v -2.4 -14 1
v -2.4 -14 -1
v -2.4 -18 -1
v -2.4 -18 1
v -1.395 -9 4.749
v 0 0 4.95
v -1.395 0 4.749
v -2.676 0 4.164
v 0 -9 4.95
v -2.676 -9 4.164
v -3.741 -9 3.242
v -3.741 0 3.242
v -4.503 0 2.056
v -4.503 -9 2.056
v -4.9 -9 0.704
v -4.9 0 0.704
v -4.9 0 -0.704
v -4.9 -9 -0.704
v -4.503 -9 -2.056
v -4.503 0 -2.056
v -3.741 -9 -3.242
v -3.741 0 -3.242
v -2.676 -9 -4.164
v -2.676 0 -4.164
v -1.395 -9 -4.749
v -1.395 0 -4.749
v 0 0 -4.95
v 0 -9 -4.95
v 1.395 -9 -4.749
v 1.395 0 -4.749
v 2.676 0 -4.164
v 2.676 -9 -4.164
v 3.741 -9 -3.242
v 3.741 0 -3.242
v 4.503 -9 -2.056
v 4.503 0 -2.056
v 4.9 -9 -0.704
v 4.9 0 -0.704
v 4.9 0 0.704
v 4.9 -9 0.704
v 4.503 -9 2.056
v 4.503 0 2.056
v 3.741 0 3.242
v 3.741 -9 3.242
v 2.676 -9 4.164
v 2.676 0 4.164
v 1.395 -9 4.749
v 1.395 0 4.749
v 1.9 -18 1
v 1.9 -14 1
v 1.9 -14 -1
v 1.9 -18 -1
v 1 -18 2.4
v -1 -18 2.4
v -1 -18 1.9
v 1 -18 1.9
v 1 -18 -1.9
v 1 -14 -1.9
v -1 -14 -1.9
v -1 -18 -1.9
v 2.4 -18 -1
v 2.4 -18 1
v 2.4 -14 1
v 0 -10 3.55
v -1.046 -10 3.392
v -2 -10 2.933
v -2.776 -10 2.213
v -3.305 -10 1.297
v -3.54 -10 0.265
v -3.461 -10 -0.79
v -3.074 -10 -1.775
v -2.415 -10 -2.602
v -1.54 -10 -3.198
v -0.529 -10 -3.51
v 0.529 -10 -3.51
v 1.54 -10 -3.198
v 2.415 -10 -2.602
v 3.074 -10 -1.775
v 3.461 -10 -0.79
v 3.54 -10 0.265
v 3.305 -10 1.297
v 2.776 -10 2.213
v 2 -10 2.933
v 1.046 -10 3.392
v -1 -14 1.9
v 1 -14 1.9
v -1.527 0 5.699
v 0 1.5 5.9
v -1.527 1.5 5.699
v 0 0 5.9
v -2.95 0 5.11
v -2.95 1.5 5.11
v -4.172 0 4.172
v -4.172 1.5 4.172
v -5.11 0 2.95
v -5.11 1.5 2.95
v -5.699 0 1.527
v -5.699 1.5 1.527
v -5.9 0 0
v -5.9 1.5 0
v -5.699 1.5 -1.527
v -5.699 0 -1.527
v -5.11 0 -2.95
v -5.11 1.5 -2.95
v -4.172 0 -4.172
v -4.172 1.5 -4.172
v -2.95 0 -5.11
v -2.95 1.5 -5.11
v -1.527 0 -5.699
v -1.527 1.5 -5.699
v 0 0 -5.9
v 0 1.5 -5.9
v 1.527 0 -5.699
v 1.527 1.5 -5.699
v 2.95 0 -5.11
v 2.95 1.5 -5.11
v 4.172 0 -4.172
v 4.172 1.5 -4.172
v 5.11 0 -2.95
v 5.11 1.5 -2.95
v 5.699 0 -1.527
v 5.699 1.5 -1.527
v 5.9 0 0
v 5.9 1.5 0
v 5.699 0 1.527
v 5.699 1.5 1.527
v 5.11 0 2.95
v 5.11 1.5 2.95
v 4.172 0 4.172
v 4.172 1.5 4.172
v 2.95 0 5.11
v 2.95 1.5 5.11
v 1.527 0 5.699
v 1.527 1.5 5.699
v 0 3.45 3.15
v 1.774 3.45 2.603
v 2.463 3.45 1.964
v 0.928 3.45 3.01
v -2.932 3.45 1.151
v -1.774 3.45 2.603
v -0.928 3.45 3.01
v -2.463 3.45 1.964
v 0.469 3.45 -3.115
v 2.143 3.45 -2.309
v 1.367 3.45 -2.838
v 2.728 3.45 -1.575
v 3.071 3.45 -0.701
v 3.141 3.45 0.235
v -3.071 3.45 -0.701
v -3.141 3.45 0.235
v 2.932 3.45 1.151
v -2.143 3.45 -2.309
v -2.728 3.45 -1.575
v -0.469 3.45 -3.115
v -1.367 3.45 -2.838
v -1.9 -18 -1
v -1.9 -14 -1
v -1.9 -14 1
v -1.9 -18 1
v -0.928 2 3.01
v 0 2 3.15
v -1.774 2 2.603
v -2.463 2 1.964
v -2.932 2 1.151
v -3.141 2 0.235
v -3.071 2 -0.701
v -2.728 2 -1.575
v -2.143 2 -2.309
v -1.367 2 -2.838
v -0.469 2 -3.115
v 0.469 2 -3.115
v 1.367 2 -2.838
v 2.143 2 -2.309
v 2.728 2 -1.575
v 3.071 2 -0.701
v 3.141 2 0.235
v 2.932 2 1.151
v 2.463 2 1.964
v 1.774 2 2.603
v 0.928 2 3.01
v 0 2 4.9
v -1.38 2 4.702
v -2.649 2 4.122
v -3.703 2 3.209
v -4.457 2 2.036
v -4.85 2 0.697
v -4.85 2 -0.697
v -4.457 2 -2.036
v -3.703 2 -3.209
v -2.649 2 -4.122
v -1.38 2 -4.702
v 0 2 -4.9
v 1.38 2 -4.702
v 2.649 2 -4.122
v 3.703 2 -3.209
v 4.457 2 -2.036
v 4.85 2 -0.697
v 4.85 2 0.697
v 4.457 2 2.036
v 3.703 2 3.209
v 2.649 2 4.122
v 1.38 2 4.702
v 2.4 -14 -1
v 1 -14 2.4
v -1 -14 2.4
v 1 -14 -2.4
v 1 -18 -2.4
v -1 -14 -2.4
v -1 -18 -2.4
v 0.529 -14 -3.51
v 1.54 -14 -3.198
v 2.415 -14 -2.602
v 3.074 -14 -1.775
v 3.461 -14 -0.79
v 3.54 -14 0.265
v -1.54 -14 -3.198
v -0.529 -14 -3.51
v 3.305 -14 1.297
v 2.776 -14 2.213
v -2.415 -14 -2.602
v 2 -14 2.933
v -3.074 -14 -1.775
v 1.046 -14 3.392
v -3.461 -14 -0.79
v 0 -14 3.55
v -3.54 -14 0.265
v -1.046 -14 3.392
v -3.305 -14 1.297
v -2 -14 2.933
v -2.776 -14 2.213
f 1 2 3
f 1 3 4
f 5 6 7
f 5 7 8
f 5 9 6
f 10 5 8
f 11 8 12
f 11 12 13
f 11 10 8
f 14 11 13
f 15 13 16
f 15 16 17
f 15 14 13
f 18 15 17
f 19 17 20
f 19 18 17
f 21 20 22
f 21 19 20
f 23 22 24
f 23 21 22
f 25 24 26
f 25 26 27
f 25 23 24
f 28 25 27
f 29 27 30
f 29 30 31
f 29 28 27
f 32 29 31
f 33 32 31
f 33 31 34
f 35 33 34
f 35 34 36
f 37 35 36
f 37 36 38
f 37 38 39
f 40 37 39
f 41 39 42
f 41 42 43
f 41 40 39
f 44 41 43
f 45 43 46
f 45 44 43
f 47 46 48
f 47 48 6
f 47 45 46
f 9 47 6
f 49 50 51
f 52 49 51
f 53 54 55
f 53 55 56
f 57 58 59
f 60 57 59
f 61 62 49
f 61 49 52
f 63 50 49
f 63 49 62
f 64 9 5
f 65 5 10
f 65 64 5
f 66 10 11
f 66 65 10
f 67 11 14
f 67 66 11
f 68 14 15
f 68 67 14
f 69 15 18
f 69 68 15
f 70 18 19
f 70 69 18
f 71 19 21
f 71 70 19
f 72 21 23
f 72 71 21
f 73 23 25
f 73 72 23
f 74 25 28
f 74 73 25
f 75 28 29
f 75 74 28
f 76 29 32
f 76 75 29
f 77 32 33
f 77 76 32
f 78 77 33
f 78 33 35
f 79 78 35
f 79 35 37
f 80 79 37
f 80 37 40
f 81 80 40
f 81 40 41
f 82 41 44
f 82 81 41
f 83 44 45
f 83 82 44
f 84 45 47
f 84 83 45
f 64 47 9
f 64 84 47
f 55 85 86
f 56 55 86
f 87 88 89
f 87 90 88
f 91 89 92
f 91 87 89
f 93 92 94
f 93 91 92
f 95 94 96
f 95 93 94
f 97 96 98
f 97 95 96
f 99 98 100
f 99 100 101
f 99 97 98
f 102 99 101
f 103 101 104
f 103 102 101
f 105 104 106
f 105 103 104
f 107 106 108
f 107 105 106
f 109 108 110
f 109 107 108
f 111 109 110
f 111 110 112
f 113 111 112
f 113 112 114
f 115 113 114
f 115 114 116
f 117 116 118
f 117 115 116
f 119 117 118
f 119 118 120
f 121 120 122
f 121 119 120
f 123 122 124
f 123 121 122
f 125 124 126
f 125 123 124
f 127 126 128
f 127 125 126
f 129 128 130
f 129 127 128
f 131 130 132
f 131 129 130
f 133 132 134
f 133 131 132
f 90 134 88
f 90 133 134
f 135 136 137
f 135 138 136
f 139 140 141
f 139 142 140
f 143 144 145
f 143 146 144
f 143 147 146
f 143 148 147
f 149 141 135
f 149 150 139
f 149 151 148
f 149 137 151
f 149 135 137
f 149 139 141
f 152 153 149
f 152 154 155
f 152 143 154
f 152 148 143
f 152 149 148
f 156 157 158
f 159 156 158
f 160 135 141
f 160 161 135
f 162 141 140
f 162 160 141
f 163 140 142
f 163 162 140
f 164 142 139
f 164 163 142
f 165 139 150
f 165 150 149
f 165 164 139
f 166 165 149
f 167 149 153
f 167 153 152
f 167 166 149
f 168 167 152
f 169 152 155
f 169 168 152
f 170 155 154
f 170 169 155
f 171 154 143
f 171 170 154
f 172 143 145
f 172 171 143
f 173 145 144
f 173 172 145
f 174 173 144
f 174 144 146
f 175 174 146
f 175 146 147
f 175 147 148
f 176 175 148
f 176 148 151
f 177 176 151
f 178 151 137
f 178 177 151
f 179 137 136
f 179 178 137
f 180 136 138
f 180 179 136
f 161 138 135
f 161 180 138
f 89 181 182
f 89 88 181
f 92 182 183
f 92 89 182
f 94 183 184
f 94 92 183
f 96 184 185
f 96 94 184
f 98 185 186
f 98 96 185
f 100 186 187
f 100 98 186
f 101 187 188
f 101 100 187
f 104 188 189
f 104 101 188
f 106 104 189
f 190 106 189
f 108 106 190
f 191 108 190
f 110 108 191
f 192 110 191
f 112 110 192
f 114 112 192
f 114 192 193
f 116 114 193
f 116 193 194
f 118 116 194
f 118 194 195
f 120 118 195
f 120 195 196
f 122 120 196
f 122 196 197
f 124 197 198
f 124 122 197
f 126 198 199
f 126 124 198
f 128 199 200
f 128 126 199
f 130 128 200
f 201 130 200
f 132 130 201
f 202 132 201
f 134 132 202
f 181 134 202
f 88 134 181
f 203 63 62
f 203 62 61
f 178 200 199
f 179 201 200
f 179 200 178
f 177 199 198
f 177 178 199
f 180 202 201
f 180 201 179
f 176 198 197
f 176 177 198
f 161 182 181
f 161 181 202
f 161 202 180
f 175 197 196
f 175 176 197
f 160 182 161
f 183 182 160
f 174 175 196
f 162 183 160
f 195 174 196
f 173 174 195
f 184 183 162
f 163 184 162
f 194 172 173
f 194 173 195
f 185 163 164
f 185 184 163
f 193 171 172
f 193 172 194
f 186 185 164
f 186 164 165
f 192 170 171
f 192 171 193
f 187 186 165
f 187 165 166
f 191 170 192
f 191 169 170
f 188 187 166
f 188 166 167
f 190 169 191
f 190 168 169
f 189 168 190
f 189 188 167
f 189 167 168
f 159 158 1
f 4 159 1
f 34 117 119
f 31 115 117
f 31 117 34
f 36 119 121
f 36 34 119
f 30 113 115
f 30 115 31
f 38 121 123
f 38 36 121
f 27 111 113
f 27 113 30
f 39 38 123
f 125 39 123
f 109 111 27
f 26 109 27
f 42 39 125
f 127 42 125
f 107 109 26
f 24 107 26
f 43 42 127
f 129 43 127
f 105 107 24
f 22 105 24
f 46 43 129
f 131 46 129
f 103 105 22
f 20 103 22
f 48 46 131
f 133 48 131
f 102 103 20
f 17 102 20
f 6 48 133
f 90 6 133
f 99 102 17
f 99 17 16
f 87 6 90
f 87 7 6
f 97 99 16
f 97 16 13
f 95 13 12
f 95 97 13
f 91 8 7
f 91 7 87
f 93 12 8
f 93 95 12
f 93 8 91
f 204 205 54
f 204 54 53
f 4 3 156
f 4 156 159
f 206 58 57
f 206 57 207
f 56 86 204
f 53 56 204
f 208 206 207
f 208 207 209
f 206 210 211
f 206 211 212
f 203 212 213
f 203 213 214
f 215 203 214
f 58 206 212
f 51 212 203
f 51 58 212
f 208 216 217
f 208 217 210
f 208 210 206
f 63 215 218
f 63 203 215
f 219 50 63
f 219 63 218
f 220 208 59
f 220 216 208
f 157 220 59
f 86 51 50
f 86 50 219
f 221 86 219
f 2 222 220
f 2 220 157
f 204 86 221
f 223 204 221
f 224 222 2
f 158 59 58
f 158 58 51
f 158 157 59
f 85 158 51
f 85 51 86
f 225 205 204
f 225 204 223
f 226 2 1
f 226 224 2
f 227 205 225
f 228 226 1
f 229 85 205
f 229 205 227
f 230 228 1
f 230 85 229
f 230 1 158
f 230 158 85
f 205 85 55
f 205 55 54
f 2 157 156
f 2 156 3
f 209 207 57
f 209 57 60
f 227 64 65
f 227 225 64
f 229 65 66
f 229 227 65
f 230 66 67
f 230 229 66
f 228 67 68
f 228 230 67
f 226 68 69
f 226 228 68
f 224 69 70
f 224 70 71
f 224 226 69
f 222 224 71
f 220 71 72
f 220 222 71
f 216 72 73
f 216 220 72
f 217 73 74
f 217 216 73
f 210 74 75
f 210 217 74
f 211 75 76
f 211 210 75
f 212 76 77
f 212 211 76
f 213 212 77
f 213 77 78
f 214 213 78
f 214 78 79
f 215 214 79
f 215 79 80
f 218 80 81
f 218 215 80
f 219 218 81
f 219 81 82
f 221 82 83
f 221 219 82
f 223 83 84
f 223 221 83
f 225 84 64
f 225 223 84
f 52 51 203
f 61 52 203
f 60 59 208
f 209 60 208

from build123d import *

# Parameters (mm, degrees)
ESQUISSE2_W                  = 2
ESQUISSE2_H                  = 0.5
BOSS_EXTRU_1_DEPTH           = 4
R_P_TITION_CIRCULAIRE1_COUNT = 4


with BuildPart() as part:
    # Esquisse1 → Révolution1 (revolve)
    with BuildSketch(Plane.XY, mode=Mode.PRIVATE) as r_volution1_sk:
        Polygon((0, 3.45), (-3.15, 3.45), (-3.15, 2), (-4.9, 2), (-5.9, 1.5), (-5.9, 0), (-4.95, 0), (-4.95, -9), (-3.55, -10), (-3.55, -14), (0, -14), align=None)
    revolve(r_volution1_sk.sketch.rotate(Axis((0, 55, 0), (0, -1, 0)), 270), axis=Axis((0, 55, 0), (0, -1, 0)))

    # Esquisse2 → Boss.-Extru.1 (add)
    with BuildSketch(Plane.XZ.offset(14)):
        with Locations((0, 2.15)):
            Rectangle(ESQUISSE2_W, ESQUISSE2_H)
    boss_extru_1 = extrude(amount=BOSS_EXTRU_1_DEPTH)

    # Répétition circulaire1: Boss.-Extru.1 ×4 about axis
    r_p_tition_circulaire1_axis = Axis((0, 0, 0), (0, 1, 0))
    for i in range(1, R_P_TITION_CIRCULAIRE1_COUNT):
        add(boss_extru_1.rotate(r_p_tition_circulaire1_axis, i * 360 / R_P_TITION_CIRCULAIRE1_COUNT))


solid = part.part
